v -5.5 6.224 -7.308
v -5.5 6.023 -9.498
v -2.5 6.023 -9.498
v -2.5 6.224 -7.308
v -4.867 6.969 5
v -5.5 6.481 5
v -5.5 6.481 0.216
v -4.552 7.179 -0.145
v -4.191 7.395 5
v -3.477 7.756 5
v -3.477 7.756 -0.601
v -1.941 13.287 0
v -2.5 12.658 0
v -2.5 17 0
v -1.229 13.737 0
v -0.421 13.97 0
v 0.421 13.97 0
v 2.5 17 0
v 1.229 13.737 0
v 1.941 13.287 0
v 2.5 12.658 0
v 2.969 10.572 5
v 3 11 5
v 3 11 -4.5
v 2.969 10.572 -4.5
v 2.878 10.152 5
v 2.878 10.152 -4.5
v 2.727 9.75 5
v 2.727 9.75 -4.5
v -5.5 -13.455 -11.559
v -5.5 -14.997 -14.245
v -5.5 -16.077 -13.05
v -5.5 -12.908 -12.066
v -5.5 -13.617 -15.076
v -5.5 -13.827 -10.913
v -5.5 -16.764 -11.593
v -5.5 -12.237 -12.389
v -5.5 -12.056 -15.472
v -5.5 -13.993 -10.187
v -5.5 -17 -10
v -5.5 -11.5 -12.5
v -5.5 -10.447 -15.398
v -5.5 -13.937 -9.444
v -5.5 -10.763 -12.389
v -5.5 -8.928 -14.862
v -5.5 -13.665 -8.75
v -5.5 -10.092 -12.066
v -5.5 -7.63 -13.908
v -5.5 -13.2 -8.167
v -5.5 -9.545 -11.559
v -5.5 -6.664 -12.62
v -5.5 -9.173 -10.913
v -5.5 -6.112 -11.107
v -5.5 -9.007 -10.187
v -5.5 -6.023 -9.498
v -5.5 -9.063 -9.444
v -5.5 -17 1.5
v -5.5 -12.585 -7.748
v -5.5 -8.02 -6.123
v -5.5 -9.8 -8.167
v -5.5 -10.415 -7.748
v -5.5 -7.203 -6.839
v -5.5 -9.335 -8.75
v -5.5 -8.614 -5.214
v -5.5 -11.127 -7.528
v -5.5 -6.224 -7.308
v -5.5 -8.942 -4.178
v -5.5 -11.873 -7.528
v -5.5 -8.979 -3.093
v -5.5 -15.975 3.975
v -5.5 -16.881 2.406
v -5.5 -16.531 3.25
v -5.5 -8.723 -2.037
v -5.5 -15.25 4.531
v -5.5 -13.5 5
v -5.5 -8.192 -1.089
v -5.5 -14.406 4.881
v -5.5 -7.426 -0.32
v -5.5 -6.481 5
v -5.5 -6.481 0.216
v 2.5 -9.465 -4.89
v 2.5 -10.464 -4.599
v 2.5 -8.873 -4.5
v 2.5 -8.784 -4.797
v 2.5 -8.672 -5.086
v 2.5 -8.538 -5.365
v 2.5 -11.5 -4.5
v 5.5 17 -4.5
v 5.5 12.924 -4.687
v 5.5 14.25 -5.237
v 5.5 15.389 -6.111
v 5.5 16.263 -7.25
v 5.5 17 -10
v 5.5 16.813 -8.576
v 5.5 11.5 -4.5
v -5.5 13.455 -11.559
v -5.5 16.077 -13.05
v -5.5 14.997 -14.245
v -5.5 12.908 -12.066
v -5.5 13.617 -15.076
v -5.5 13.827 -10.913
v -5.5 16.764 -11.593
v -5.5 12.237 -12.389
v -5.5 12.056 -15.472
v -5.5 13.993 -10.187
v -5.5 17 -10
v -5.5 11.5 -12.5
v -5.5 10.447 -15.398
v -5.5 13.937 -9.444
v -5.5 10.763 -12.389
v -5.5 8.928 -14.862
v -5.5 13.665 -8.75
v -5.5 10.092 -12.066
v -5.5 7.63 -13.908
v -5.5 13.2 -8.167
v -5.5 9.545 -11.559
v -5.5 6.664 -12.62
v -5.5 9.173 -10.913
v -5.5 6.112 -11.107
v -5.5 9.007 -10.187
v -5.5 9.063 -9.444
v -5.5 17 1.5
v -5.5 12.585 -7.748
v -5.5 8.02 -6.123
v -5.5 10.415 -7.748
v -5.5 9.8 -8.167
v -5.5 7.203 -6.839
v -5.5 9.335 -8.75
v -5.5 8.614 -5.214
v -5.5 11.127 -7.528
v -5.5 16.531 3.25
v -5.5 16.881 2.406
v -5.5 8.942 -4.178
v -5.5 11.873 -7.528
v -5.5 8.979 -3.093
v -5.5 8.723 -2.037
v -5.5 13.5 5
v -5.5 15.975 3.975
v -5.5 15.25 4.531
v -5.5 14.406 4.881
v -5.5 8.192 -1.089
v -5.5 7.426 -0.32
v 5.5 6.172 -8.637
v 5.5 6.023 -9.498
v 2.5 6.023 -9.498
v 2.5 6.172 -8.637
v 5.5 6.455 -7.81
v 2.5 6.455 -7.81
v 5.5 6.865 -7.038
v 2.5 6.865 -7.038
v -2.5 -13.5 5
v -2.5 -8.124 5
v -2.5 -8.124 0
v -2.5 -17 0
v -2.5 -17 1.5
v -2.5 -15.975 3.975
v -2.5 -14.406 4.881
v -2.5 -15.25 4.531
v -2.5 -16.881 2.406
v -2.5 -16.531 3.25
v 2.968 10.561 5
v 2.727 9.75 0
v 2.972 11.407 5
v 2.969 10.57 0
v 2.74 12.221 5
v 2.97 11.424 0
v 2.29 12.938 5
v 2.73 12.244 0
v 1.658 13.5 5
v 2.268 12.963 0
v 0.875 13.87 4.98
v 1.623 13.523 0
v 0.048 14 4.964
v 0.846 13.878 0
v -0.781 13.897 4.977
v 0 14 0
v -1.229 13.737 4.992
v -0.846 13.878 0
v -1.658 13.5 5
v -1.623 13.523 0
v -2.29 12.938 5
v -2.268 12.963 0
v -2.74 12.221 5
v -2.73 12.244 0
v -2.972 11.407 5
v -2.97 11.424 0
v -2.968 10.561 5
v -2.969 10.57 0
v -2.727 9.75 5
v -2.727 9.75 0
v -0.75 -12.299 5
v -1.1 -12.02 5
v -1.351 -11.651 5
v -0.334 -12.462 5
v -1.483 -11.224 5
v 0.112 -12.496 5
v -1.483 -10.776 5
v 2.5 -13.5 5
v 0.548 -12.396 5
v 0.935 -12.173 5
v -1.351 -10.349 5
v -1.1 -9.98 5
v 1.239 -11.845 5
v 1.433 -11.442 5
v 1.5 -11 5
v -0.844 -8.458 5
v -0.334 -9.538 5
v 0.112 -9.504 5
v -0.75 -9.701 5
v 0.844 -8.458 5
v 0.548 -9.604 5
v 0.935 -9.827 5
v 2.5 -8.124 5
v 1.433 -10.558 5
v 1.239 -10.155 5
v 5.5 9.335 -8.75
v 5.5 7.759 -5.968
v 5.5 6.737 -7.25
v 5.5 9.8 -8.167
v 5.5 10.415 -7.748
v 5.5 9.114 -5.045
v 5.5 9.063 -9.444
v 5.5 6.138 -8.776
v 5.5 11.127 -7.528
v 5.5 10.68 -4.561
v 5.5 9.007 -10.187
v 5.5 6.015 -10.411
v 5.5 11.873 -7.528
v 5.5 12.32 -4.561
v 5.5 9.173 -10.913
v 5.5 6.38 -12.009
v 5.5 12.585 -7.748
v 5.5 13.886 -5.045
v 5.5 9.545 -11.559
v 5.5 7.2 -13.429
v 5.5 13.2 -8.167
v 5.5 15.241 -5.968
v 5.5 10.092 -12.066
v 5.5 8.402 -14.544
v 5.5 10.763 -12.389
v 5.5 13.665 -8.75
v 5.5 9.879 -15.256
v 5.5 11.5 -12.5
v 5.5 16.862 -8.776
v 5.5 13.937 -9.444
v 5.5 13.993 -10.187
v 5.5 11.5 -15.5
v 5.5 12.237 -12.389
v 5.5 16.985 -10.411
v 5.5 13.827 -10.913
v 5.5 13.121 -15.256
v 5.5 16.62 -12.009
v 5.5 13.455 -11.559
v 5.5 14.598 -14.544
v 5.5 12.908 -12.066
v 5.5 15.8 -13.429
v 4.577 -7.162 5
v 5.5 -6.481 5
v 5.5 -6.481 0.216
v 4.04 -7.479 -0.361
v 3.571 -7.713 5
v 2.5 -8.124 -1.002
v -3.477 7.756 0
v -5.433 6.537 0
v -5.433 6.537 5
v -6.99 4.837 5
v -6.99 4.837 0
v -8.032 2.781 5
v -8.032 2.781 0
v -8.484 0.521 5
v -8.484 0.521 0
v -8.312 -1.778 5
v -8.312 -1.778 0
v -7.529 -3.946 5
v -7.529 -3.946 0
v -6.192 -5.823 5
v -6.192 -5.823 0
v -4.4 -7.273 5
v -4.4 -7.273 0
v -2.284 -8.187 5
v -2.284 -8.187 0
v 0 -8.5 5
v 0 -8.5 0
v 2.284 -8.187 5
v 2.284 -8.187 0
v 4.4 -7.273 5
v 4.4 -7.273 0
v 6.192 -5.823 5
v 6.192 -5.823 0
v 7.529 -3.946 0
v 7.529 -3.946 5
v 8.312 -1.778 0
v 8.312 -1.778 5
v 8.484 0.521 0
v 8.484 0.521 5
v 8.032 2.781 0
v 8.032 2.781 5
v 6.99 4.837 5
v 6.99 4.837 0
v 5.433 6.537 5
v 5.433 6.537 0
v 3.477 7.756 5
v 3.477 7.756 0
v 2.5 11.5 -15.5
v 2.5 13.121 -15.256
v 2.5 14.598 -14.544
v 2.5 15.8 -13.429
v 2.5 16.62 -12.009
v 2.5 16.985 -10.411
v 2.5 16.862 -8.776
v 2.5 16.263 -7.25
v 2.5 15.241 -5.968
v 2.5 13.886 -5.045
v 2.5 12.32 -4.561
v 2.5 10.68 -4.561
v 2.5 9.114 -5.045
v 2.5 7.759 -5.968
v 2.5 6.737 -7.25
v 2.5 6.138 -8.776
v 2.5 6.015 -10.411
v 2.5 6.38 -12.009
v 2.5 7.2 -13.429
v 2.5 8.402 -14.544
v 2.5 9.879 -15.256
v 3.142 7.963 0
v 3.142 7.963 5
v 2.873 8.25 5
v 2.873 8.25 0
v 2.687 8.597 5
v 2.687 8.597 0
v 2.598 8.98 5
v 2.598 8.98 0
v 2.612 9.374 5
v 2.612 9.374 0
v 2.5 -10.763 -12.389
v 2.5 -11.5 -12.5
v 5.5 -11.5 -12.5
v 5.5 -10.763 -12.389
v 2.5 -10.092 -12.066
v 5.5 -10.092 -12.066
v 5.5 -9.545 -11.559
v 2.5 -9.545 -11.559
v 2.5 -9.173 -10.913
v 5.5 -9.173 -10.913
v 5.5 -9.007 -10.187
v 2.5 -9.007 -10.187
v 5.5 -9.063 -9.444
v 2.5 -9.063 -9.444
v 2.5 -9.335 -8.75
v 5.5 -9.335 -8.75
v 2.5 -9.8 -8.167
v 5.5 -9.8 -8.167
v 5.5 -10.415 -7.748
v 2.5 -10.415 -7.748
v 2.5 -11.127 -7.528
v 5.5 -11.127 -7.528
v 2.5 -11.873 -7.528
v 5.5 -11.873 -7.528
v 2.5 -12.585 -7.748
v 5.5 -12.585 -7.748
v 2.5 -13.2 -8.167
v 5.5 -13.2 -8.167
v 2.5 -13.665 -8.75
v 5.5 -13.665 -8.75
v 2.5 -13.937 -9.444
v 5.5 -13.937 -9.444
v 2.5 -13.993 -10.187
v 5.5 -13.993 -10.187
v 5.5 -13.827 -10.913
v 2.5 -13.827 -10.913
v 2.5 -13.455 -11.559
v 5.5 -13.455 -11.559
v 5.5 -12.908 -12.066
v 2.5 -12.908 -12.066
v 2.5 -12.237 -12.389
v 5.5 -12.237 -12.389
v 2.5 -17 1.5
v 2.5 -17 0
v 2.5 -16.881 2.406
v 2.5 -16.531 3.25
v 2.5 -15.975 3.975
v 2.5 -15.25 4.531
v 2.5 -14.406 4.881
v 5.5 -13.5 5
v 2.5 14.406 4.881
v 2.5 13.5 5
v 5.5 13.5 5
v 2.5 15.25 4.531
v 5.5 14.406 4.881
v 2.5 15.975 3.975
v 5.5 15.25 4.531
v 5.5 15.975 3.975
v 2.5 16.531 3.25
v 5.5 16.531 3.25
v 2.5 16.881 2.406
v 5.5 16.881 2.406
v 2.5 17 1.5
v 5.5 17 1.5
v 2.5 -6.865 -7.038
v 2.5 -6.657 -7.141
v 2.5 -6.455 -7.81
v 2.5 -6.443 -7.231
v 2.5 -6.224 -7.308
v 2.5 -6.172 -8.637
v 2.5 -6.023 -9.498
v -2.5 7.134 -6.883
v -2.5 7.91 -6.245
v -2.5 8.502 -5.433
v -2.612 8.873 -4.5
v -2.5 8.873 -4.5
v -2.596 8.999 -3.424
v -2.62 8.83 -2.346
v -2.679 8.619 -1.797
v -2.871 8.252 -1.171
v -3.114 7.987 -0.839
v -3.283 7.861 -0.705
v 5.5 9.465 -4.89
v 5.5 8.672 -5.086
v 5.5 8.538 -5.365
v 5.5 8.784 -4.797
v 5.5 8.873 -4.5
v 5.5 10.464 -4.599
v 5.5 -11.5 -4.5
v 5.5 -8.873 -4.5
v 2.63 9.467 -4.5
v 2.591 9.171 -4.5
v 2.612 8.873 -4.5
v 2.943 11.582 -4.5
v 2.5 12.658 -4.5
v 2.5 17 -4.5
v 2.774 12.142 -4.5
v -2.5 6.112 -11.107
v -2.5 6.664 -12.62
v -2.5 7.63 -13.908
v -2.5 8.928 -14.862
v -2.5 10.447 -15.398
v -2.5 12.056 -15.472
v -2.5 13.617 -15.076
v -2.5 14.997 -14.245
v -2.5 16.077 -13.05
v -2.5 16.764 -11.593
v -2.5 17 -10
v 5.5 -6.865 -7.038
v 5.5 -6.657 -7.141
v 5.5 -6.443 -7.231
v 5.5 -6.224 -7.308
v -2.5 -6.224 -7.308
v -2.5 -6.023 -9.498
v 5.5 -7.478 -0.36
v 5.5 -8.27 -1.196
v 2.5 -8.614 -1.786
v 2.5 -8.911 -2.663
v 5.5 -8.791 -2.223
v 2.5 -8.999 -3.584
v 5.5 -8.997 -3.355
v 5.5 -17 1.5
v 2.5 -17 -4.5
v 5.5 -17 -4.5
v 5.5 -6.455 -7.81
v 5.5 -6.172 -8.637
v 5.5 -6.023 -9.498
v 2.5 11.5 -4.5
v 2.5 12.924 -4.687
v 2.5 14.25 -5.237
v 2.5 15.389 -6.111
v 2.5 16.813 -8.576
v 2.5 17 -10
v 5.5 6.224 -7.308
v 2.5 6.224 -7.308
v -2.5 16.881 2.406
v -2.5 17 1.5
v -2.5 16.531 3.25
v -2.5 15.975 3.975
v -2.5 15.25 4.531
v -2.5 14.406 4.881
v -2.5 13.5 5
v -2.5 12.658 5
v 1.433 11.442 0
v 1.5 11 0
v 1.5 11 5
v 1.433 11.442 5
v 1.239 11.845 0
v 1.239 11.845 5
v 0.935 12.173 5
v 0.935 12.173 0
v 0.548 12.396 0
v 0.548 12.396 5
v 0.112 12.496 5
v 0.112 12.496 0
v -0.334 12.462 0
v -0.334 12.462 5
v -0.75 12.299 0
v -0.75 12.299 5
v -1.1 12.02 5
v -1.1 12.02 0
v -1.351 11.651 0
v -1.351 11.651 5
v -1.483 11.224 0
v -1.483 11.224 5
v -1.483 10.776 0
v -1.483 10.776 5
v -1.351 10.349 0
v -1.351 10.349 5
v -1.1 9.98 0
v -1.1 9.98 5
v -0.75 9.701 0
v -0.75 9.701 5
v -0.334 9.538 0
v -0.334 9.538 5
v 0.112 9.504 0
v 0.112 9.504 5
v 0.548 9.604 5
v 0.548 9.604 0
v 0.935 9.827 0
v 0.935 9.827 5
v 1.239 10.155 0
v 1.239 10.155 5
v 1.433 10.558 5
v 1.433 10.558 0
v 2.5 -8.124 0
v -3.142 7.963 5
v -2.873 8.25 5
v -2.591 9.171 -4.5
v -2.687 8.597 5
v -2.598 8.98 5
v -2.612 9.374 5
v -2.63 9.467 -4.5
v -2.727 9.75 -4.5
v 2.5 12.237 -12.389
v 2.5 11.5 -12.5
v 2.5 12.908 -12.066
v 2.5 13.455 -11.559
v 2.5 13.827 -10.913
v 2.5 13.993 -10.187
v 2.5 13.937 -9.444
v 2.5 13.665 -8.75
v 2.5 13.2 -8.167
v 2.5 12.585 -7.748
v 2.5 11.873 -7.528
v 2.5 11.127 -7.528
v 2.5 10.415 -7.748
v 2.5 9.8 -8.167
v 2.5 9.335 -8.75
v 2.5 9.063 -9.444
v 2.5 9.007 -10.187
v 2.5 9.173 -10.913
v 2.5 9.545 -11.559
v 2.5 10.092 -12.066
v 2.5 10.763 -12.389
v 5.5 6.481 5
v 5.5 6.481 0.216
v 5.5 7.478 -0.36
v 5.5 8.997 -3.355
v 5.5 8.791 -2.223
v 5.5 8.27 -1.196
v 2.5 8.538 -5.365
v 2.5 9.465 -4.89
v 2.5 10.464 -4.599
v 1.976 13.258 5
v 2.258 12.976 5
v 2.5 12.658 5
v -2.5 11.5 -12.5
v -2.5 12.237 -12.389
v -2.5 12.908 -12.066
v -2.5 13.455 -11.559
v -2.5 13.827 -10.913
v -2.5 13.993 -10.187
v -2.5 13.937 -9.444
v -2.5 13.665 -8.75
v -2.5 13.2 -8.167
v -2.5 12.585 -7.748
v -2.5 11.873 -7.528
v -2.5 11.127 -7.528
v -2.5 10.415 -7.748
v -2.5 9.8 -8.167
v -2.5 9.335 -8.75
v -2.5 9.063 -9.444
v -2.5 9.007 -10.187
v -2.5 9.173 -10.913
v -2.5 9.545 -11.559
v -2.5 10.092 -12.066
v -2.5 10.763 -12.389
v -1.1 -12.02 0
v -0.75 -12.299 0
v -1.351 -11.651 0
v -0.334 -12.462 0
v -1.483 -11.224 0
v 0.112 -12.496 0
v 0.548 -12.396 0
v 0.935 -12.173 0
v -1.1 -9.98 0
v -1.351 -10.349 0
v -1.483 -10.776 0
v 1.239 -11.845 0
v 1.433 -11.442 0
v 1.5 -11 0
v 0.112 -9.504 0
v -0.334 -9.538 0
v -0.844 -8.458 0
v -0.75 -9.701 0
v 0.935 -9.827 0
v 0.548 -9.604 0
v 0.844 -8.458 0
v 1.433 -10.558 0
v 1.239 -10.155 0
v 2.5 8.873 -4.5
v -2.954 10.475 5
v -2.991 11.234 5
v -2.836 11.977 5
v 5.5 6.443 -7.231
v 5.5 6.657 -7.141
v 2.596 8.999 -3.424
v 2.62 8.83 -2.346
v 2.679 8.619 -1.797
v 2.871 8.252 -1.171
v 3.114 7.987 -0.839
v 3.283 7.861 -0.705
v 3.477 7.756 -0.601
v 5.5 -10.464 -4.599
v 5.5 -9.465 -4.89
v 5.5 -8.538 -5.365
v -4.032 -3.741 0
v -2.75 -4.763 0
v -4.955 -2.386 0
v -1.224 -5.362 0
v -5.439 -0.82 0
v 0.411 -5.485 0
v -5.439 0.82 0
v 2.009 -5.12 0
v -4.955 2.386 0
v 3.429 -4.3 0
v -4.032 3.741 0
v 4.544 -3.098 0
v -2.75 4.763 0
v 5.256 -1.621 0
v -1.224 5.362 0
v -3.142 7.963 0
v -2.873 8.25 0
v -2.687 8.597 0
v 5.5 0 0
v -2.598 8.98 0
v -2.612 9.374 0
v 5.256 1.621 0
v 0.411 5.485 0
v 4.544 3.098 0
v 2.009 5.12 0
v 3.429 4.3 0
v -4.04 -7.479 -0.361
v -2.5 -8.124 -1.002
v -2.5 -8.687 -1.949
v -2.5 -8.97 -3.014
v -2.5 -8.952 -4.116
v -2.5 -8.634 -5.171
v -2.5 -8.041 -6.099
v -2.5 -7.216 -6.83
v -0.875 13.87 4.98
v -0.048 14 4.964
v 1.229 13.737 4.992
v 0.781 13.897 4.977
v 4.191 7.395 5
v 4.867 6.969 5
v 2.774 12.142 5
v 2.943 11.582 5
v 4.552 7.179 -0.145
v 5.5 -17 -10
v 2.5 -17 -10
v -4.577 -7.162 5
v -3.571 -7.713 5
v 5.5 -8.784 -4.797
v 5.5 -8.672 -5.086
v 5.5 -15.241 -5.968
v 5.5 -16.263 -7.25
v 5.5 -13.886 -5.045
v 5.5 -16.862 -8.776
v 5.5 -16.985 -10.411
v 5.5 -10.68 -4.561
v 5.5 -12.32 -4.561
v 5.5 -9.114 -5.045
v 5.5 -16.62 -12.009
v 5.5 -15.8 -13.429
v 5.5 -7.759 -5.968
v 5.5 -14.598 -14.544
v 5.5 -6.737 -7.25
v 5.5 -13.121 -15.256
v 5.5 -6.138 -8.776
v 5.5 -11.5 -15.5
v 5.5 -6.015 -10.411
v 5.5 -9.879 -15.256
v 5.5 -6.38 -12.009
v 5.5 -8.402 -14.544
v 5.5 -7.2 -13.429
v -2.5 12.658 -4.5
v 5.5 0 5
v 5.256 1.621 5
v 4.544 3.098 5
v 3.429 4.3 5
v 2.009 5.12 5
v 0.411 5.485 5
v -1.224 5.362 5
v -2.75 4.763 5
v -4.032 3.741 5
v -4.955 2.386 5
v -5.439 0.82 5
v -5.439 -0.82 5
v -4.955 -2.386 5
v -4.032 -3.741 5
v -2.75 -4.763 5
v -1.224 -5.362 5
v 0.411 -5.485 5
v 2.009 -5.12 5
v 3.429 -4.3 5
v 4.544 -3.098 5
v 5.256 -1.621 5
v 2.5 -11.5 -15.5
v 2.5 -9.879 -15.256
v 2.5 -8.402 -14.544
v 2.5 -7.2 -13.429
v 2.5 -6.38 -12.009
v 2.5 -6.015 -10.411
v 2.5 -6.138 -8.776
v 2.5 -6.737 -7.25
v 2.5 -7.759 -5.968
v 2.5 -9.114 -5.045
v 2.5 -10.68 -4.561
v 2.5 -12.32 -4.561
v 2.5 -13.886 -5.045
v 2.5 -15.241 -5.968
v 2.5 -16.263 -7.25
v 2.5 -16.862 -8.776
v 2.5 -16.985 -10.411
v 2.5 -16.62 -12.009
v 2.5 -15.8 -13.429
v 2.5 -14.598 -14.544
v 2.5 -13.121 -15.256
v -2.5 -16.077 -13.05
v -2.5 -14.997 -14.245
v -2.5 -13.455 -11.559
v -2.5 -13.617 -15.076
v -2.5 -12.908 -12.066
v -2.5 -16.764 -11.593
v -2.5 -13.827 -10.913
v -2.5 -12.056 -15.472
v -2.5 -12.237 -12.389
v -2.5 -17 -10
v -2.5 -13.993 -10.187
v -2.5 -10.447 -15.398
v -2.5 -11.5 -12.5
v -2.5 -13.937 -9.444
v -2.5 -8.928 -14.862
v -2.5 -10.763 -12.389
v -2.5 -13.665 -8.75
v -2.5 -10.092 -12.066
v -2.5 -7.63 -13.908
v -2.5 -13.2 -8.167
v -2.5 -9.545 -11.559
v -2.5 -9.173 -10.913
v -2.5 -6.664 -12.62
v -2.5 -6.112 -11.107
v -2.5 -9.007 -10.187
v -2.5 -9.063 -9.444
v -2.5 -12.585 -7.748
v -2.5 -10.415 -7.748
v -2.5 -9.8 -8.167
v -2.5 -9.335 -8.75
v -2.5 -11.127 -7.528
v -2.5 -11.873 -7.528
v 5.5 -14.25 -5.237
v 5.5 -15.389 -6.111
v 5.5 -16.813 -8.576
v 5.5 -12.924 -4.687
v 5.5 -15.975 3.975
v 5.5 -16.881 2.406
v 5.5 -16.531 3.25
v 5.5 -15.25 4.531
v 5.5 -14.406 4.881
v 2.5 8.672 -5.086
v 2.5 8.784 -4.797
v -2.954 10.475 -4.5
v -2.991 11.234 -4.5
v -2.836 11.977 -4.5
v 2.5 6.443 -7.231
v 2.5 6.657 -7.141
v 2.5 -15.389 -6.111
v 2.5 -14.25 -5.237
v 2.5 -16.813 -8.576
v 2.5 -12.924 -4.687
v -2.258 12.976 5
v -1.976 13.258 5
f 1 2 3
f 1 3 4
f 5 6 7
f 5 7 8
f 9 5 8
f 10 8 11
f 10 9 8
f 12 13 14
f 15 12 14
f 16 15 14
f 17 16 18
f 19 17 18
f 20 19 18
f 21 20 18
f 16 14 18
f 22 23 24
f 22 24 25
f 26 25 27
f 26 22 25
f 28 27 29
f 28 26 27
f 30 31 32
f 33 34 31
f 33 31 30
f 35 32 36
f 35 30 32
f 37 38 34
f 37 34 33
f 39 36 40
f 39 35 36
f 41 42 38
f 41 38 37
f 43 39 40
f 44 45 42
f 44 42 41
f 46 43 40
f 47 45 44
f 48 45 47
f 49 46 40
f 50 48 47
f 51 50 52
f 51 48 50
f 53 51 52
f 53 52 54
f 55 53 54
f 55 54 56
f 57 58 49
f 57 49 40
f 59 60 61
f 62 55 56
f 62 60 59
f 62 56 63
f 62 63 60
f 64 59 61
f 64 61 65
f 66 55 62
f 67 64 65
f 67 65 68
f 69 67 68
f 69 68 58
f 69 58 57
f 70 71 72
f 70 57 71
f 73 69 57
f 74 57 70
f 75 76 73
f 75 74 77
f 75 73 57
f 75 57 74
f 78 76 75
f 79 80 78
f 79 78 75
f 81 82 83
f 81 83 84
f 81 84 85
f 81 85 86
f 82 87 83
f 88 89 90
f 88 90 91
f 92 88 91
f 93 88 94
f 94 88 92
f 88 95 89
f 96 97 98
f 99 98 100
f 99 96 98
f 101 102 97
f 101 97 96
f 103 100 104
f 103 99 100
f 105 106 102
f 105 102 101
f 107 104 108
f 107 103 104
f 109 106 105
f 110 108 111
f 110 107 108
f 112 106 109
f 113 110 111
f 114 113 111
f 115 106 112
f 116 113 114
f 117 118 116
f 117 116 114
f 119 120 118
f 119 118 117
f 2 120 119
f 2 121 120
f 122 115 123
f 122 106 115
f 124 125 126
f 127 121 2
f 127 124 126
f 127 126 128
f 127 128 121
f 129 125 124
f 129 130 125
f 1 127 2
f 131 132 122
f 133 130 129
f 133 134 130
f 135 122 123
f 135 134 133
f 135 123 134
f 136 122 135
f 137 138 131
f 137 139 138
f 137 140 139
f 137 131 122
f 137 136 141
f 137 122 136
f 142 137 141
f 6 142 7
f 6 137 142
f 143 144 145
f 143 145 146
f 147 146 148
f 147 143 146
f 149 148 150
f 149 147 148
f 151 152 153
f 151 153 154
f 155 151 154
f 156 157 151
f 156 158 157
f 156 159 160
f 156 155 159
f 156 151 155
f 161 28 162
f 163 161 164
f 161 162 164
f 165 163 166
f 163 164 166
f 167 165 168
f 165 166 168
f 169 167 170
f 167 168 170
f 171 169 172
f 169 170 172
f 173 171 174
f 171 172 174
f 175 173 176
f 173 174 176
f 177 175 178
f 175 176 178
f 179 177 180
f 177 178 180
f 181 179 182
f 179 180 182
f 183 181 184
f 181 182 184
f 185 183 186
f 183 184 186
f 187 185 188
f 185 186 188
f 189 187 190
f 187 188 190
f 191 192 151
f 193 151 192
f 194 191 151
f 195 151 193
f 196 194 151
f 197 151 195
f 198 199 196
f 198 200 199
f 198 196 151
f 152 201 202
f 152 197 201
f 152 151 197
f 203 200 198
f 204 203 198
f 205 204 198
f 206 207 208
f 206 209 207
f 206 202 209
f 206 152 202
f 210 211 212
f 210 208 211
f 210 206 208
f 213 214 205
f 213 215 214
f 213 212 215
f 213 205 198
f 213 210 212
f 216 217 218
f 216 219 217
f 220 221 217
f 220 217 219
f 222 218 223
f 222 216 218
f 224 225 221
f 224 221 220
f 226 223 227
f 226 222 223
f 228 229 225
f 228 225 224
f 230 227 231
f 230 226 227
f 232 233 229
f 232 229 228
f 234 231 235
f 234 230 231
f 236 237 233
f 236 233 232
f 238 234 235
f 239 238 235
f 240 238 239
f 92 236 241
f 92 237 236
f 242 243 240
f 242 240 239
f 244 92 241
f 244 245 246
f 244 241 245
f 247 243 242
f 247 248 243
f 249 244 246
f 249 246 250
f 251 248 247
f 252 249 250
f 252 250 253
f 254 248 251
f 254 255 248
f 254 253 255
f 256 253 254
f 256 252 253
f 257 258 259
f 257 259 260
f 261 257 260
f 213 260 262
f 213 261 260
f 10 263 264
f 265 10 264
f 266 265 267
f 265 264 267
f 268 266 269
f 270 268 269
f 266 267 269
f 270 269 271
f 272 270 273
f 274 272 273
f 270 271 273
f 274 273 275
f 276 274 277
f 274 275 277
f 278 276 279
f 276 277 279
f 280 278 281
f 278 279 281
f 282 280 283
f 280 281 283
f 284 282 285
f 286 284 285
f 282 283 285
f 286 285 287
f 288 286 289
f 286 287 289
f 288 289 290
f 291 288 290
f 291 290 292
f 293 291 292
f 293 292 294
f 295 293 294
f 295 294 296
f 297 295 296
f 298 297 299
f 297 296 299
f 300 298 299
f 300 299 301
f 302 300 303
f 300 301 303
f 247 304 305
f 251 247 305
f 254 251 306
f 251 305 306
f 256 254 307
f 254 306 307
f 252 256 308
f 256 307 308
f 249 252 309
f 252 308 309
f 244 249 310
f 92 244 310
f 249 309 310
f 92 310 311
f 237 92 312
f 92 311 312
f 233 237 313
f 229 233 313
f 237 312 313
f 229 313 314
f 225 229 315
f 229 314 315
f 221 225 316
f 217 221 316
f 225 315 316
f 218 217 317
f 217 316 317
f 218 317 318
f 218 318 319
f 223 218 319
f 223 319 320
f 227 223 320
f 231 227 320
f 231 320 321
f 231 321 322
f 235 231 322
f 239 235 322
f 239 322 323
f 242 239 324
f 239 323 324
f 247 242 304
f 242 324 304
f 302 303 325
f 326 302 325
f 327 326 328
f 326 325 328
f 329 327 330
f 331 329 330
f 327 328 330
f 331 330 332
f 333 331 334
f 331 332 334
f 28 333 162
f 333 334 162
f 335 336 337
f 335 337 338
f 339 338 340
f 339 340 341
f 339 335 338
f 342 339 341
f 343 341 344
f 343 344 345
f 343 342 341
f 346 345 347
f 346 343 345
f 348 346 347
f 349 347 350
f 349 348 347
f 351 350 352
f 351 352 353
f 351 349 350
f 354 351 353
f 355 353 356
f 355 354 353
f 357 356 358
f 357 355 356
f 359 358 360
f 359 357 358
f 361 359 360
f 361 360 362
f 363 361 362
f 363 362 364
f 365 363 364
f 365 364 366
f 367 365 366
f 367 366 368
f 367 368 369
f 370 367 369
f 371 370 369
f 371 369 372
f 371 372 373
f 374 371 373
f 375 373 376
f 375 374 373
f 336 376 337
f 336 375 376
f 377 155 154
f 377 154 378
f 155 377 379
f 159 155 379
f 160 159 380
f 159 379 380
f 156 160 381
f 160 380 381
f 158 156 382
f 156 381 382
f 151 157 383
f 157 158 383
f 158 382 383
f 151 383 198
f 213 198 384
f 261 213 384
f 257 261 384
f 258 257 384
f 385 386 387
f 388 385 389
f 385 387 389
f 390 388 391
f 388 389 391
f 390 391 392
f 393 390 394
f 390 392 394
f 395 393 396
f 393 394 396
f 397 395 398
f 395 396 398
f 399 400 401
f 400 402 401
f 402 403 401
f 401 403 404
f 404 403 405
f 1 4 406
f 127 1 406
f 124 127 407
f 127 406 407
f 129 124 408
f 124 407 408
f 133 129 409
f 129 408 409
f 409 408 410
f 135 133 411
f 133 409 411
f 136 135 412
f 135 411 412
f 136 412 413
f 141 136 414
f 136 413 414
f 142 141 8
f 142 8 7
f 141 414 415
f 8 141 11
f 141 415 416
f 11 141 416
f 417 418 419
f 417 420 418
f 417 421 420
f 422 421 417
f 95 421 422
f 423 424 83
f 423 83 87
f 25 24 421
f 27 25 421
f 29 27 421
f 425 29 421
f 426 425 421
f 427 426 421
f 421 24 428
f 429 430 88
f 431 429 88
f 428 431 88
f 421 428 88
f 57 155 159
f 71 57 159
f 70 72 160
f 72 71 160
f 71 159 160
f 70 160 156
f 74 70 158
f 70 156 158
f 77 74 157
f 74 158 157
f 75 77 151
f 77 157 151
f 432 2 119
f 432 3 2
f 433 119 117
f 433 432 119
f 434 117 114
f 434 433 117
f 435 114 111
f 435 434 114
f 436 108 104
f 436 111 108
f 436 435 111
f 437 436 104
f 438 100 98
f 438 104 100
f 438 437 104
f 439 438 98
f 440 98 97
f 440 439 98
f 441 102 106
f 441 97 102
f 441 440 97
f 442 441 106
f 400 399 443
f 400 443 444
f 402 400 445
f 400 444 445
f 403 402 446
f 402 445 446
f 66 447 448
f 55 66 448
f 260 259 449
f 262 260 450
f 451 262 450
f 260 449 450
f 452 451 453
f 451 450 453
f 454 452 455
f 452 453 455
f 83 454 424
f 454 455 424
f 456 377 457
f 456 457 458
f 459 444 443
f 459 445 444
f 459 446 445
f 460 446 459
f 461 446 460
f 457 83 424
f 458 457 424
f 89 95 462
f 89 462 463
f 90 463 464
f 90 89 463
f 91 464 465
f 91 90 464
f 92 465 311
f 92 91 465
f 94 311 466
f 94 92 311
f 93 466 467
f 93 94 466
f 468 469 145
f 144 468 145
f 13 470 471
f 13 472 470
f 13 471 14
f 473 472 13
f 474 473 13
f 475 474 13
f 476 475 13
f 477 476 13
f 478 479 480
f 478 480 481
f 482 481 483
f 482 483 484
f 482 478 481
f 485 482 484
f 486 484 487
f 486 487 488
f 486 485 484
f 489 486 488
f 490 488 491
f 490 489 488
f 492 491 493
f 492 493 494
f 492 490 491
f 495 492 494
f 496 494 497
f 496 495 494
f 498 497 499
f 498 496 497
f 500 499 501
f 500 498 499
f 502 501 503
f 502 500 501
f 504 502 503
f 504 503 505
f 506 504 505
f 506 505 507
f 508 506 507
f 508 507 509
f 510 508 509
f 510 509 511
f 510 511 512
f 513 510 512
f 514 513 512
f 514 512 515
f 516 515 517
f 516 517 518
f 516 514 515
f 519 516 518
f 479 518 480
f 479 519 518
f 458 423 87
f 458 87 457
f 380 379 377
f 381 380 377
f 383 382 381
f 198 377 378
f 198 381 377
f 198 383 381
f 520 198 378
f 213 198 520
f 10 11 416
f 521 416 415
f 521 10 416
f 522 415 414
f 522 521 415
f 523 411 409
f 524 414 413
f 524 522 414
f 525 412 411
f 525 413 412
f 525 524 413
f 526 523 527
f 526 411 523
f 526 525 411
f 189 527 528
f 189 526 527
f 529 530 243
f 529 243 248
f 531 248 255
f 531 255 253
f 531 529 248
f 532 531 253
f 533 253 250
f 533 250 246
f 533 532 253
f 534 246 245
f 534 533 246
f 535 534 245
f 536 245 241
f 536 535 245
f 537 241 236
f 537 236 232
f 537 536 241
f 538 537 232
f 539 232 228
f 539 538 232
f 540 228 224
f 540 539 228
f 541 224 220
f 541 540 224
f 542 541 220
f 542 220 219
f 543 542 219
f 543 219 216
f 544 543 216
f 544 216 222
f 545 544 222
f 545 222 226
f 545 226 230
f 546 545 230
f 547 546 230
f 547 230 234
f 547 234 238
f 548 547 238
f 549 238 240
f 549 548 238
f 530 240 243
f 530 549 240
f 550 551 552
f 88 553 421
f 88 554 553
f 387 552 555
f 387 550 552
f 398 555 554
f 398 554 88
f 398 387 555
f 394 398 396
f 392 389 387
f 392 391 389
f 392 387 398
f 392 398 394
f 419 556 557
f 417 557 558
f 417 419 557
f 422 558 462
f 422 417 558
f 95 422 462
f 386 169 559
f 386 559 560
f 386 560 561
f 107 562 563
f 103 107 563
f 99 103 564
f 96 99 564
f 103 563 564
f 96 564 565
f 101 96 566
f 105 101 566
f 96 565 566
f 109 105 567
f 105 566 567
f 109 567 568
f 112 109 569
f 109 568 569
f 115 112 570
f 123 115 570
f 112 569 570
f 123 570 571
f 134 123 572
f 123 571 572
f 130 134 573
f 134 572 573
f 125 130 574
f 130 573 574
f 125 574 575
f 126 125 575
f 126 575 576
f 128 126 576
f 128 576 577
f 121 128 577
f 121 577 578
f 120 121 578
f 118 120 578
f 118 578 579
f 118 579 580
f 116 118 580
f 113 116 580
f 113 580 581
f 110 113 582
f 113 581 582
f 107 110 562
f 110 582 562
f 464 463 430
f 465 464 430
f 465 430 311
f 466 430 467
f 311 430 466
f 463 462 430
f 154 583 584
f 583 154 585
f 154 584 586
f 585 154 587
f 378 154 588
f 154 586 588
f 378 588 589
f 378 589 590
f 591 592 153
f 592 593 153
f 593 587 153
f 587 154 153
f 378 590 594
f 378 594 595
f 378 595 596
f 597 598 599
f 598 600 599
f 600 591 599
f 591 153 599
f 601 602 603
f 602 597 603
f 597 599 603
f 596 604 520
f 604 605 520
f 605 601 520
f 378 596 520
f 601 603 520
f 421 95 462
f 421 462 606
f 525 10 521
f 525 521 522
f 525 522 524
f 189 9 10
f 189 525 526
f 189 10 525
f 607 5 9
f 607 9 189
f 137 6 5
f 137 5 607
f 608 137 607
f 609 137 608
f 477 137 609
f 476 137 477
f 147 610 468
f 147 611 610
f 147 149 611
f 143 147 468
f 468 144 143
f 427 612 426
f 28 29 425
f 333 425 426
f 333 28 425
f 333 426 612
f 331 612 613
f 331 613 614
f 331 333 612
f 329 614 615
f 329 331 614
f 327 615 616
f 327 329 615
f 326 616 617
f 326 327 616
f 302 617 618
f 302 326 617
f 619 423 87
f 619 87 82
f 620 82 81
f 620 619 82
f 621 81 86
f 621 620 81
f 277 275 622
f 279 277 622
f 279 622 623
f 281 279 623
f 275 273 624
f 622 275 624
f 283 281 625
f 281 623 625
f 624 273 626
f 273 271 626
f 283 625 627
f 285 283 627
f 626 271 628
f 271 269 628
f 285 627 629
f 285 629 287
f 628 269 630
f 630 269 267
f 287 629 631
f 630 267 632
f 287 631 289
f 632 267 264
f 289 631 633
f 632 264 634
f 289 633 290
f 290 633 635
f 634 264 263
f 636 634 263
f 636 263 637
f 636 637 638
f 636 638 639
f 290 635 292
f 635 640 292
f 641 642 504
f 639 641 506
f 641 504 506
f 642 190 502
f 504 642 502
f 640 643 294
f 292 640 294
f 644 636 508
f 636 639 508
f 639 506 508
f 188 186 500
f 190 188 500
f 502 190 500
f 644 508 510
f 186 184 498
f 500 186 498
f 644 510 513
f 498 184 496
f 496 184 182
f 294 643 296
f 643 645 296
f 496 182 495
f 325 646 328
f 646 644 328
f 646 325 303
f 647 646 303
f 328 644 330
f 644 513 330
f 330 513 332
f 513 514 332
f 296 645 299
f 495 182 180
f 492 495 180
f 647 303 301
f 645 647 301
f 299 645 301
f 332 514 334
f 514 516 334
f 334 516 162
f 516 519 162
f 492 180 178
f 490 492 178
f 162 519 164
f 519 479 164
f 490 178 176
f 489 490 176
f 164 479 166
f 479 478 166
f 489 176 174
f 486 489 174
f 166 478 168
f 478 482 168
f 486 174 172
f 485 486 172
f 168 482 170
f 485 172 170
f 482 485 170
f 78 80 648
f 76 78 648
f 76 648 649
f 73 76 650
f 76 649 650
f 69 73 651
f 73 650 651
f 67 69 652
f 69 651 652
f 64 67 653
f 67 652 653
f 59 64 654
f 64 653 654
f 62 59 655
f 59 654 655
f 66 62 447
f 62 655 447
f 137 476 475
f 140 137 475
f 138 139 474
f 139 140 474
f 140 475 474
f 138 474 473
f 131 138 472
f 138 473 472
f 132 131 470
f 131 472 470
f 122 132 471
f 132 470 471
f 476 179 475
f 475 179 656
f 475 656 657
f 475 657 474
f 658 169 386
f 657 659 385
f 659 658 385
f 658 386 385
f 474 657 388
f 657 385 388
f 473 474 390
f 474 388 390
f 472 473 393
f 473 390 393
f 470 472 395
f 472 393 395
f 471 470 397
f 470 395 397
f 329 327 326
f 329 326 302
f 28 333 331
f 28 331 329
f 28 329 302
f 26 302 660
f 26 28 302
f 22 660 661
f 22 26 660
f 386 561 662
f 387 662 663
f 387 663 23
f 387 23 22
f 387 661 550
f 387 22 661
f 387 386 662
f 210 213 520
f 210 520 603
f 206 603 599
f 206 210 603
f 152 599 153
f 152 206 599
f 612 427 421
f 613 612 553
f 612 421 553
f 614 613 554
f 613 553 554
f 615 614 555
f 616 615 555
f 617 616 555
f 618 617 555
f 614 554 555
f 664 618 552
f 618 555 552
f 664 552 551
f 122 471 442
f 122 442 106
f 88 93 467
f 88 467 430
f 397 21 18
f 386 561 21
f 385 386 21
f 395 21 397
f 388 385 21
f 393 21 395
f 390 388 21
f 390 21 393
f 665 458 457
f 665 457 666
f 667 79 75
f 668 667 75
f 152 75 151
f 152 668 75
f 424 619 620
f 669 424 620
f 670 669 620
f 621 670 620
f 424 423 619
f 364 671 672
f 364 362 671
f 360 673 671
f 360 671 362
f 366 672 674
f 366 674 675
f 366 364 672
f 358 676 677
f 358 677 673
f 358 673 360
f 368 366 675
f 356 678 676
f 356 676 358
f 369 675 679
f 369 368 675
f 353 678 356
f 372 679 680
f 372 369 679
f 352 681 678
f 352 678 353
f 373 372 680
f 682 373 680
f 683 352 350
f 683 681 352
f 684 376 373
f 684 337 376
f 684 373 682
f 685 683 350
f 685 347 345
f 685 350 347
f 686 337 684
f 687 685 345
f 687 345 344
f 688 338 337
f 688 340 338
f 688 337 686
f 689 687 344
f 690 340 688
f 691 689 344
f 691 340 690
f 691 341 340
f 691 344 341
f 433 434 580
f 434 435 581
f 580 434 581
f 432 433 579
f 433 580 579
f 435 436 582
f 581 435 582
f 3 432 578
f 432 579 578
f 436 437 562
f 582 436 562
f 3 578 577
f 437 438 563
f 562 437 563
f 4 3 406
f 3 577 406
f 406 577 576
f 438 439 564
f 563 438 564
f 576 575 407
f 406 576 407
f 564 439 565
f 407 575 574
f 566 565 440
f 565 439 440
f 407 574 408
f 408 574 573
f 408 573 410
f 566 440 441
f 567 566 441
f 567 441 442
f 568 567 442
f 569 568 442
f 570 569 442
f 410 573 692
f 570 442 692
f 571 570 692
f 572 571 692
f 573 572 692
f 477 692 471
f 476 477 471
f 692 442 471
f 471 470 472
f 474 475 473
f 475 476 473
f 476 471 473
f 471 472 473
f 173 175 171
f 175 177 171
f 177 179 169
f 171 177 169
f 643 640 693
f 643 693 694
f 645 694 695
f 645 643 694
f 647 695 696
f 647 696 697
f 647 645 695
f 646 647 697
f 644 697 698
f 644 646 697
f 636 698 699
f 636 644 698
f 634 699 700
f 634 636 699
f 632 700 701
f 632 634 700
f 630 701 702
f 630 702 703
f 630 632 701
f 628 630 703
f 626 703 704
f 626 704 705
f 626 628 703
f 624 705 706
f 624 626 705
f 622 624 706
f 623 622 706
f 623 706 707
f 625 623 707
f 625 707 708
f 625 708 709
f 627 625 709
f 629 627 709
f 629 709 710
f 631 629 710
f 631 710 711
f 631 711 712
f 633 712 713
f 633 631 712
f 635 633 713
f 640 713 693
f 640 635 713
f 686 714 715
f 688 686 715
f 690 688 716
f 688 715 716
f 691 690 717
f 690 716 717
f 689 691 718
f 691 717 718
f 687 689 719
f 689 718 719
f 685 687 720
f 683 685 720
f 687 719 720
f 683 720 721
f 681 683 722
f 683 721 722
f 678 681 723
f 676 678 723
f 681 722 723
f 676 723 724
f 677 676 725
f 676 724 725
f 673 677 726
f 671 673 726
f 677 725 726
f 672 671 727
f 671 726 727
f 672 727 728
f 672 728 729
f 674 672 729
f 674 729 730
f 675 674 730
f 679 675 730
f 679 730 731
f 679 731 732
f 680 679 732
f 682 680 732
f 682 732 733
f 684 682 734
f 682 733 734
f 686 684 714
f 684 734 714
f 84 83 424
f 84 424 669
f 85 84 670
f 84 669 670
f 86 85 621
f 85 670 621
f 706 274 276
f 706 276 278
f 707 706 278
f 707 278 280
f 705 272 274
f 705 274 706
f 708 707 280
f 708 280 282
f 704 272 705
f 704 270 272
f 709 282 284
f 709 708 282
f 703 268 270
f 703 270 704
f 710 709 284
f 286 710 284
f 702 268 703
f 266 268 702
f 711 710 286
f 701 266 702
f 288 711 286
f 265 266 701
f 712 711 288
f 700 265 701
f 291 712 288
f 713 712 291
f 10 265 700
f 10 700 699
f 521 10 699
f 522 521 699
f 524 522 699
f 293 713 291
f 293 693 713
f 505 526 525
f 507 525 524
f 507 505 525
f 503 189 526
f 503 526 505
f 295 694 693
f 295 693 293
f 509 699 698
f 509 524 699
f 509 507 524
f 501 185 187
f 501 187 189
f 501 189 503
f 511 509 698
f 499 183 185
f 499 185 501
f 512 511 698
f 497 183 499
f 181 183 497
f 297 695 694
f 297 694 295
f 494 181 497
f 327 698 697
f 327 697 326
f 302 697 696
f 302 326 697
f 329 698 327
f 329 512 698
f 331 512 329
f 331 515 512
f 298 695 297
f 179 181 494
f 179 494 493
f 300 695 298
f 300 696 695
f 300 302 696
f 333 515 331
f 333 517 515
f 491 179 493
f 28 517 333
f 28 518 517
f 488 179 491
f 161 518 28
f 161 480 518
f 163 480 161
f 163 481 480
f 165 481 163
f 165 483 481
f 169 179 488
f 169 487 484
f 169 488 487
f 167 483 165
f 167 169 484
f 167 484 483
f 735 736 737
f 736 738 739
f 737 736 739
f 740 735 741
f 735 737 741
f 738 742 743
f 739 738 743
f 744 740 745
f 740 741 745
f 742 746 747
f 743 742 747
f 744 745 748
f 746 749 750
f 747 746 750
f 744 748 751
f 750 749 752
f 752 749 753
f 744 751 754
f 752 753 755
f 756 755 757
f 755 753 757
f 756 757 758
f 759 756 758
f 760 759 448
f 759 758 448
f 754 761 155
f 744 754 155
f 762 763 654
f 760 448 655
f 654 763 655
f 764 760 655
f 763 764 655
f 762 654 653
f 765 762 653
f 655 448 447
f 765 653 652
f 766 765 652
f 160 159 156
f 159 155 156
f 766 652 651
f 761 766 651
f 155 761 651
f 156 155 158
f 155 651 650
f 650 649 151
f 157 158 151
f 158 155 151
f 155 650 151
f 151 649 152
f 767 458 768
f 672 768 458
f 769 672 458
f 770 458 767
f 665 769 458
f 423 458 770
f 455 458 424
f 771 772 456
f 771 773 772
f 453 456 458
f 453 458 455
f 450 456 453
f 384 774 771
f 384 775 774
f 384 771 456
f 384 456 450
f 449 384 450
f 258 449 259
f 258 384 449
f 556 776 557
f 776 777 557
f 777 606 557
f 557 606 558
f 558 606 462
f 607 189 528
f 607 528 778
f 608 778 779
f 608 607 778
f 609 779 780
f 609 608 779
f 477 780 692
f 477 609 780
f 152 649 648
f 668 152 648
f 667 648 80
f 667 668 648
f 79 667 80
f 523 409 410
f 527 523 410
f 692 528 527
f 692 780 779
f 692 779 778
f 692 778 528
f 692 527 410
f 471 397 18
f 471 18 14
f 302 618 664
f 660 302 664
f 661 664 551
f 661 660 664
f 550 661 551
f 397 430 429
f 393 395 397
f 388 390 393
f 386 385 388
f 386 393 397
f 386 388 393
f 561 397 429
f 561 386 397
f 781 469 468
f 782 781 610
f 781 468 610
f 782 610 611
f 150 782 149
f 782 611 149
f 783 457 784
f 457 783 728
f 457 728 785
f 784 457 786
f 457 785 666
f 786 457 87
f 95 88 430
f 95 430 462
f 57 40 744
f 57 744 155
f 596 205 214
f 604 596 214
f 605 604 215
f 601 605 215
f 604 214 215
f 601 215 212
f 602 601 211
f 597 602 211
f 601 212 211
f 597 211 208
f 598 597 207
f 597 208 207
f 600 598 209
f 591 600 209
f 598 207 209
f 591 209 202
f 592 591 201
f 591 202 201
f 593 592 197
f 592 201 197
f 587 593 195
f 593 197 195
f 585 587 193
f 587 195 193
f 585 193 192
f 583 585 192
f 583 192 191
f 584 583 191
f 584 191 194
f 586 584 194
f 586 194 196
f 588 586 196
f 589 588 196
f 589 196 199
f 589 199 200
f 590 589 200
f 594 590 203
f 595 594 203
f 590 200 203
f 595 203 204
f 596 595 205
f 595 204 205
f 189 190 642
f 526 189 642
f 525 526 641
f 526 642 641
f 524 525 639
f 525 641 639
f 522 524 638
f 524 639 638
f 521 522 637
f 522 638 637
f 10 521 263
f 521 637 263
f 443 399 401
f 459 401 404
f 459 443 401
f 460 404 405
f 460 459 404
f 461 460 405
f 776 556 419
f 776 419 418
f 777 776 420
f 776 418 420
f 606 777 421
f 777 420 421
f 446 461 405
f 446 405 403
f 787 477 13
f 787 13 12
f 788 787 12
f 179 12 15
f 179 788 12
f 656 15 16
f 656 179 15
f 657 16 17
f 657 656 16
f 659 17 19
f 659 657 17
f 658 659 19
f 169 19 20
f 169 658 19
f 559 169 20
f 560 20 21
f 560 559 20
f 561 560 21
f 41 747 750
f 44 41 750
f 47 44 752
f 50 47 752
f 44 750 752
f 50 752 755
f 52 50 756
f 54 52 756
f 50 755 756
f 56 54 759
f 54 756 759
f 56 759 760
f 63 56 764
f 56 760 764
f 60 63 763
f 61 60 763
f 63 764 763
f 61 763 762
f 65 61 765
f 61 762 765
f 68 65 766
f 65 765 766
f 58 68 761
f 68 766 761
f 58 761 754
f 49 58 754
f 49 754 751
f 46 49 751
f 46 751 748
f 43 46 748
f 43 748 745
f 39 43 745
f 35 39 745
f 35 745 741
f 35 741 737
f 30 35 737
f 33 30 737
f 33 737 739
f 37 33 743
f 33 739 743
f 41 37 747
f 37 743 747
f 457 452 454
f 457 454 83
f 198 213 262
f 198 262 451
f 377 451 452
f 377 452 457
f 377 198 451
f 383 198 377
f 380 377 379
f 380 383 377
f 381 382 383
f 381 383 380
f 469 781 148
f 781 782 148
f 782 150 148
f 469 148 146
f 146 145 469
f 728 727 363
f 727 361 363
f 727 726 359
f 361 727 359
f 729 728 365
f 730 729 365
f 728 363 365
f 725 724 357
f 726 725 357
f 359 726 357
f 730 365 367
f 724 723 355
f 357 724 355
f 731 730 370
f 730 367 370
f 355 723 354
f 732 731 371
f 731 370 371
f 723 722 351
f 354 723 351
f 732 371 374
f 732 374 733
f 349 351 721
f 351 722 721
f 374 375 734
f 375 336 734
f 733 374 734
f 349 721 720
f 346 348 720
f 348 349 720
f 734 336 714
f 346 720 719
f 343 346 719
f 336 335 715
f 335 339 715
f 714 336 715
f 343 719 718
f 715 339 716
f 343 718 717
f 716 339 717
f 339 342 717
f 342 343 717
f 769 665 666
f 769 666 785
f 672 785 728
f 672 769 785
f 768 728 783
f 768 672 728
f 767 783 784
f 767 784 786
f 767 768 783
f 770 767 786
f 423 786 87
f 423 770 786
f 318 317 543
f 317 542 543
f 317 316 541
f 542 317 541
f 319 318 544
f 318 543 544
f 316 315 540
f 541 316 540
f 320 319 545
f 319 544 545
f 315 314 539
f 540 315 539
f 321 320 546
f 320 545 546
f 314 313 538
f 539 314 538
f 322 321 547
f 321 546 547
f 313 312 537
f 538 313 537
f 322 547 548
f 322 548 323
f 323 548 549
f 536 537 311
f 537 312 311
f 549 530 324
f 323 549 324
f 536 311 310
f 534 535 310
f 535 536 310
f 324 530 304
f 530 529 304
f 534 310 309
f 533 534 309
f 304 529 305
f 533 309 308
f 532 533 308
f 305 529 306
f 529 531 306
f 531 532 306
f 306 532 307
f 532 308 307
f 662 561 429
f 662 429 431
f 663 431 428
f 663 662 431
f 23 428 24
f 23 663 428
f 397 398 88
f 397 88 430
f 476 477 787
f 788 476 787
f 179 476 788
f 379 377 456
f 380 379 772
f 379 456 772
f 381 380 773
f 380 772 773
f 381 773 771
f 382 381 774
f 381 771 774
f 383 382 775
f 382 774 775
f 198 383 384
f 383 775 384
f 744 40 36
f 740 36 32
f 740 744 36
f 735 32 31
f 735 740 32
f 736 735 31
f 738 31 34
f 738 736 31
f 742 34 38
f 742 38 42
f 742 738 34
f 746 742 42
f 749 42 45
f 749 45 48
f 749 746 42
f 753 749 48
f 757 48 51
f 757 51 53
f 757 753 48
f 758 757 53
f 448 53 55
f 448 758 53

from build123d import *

# Parameters (mm, degrees)
SKETCH_1_R          = 5.5
SKETCH_1_R_2        = 1.5
EXTRUDE_1_DEPTH     = 5
EXTRUDE_START       = -2.5
SKETCH_2_R          = 5.5
SKETCH_2_R_2        = 2.5
EXTRUDE_2_DEPTH     = 3
EXTRUDE_2_2_DEPTH   = 3
EXTRUDE_START_2     = 2.5
SKETCH_3_R          = 5.5
SKETCH_3_R_2        = 2.5
EXTRUDE_3_DEPTH     = 3
EXTRUDE_3_2_DEPTH   = 3
EXTRUDE_4_DEPTH     = 9.5
EXTRUDE_4_2_DEPTH   = 9.5
EXTRUDE_4_3_DEPTH   = 9.5
EXTRUDE_4_4_DEPTH   = 9.5
EXTRUDE_5_DEPTH     = 3
EXTRUDE_6_DEPTH     = 3
EXTRUDE_6_2_DEPTH   = 3
EXTRUDE_6_3_DEPTH   = 3
EXTRUDE_6_4_DEPTH   = 3
EXTRUDE_7_DEPTH     = 5
EXTRUDE_7_2_DEPTH   = 5
SKETCH_8_R          = 4
CUT_EXTRUDE_1_DEPTH = 27.930466019
SKETCH_9_R          = 1.5
CUT_EXTRUDE_2_DEPTH = 5
CUT_EXTRUDE_3_DEPTH = 27.930466019


with BuildPart() as part:
    # Эскиз1 → Бобышка-Вытянуть1 (new body)
    with BuildSketch(Plane.XY):
        with BuildLine():
            ThreePointArc((-3.477151956, 7.756250013), (-2.2e-08, -8.5), (3.477151997, 7.756249995))
            ThreePointArc((3.477151997, 7.756249995), (2.686810587, 8.596884227), (2.727178017, 9.749999975))
            ThreePointArc((2.727178017, 9.749999975), (2.2e-08, 14), (-2.727178036, 9.750000015))
            ThreePointArc((-2.727178036, 9.750000015), (-2.686810571, 8.596884269), (-3.477151956, 7.756250013))
        make_face()
        Circle(SKETCH_1_R, mode=Mode.SUBTRACT)
        with Locations((0, 11)):
            Circle(SKETCH_1_R_2, mode=Mode.SUBTRACT)
    extrude(amount=EXTRUDE_1_DEPTH)


with BuildPart() as body_2:
    # Эскиз2 → Бобышка-Вытянуть2 (new body)
    with BuildSketch(Plane(origin=(0, 0, 0), x_dir=(0, 0, -1), z_dir=(1, 0, 0)).offset(EXTRUDE_START)):
        with Locations((10, 11.5)):
            Circle(SKETCH_2_R)
        with Locations((10, 11.5)):
            Circle(SKETCH_2_R_2, mode=Mode.SUBTRACT)
    extrude(amount=-EXTRUDE_2_DEPTH)



with BuildPart() as body_3:
    # Эскиз2 → Extrude 2 2 (new body)
    with BuildSketch(Plane(origin=(0, 0, 0), x_dir=(0, 0, -1), z_dir=(1, 0, 0)).offset(EXTRUDE_START)):
        with Locations((10, -11.5)):
            Circle(SKETCH_2_R)
        with Locations((10, -11.5)):
            Circle(SKETCH_2_R_2, mode=Mode.SUBTRACT)
    extrude(amount=-EXTRUDE_2_2_DEPTH)


with BuildPart() as body_4:
    # Эскиз3 → Бобышка-Вытянуть3 (new body)
    with BuildSketch(Plane(origin=(0, 0, 0), x_dir=(0, 0, -1), z_dir=(1, 0, 0)).offset(EXTRUDE_START_2)):
        with Locations((10, 11.5)):
            Circle(SKETCH_3_R)
        with Locations((10, 11.5)):
            Circle(SKETCH_3_R_2, mode=Mode.SUBTRACT)
    extrude(amount=EXTRUDE_3_DEPTH)


with BuildPart() as body_5:
    # Эскиз3 → Extrude 3 2 (new body)
    with BuildSketch(Plane(origin=(0, 0, 0), x_dir=(0, 0, -1), z_dir=(1, 0, 0)).offset(EXTRUDE_START_2)):
        with Locations((10, -11.5)):
            Circle(SKETCH_3_R)
        with Locations((10, -11.5)):
            Circle(SKETCH_3_R_2, mode=Mode.SUBTRACT)
    extrude(amount=EXTRUDE_3_2_DEPTH)


with BuildPart() as body_6:
    # Эскиз4 → Бобышка-Вытянуть4 (new body)
    with BuildSketch(Plane.XY.offset(5)):
        with BuildLine():
            ThreePointArc((-2.5, -8.124038405), (-4.083516479, -7.454857018), (-5.5, -6.480740698))
            Line((-5.5, -6.480740698), (-5.5, -17))
            Line((-5.5, -17), (-2.5, -17))
            Line((-2.5, -17), (-2.5, -8.124038405))
        make_face()
    extrude(amount=-EXTRUDE_4_DEPTH)


with BuildPart() as body_7:
    # Эскиз4 → Extrude 4 2 (new body)
    with BuildSketch(Plane.XY.offset(5)):
        with BuildLine():
            ThreePointArc((5.5, -6.480740698), (4.083516479, -7.454857018), (2.5, -8.124038405))
            Line((2.5, -8.124038405), (2.5, -17))
            Line((2.5, -17), (5.5, -17))
            Line((5.5, -17), (5.5, -6.480740698))
        make_face()
    extrude(amount=-EXTRUDE_4_2_DEPTH)


with BuildPart() as body_8:
    # Эскиз4 → Extrude 4 3 (new body)
    with BuildSketch(Plane.XY.offset(5)):
        with BuildLine():
            Line((2.5, 17), (2.5, 12.658312395))
            ThreePointArc((2.5, 12.658312395), (2.872281323, 11.866025404), (3, 11))
            ThreePointArc((3, 11), (2.931001031, 10.360286817), (2.727178029, 9.75))
            ThreePointArc((2.727178029, 9.75), (2.68681058, 8.596884246), (3.477151987, 7.75625))
            ThreePointArc((3.477151987, 7.75625), (4.533656961, 7.189989886), (5.5, 6.480740698))
            Line((5.5, 6.480740698), (5.5, 17))
            Line((5.5, 17), (2.5, 17))
        make_face()
    extrude(amount=-EXTRUDE_4_3_DEPTH)


with BuildPart() as body_9:
    # Эскиз4 → Extrude 4 4 (new body)
    with BuildSketch(Plane.XY.offset(5)):
        with BuildLine():
            Line((-5.5, 17), (-5.5, 6.480740698))
            ThreePointArc((-5.5, 6.480740698), (-4.533656961, 7.189989886), (-3.477151987, 7.75625))
            ThreePointArc((-3.477151987, 7.75625), (-2.68681058, 8.596884246), (-2.727178029, 9.75))
            ThreePointArc((-2.727178029, 9.75), (-2.990889129, 11.233628374), (-2.5, 12.658312395))
            Line((-2.5, 12.658312395), (-2.5, 17))
            Line((-2.5, 17), (-5.5, 17))
        make_face()
    extrude(amount=-EXTRUDE_4_4_DEPTH)


with BuildPart() as body_2_1:
    add(body_2.part)

    add(body_3.part)  # Бобышка-Вытянуть5 merges body 3

    add(body_6.part)  # Бобышка-Вытянуть5 merges body 6

    add(body_9.part)  # Бобышка-Вытянуть5 merges body 9
    # Эскиз5 → Бобышка-Вытянуть5 (add)
    with BuildSketch(Plane.ZY.offset(5.5)):
        with BuildLine():
            Line((-4.5, -6.480740698), (-9.498336734, -6.022926514))
            ThreePointArc((-9.498336734, -6.022926514), (-5.937417819, -7.792517563), (-4.5, -11.5))
            Line((-4.5, -11.5), (-4.5, -6.480740698))
        make_face()
        with BuildLine():
            Line((-4.5, -17), (-4.5, -11.5))
            ThreePointArc((-4.5, -11.5), (-6.110912703, -15.389087297), (-10, -17))
            Line((-10, -17), (-4.5, -17))
        make_face()
        with BuildLine():
            Line((-4.5, 6.480740698), (-4.5, 11.5))
            ThreePointArc((-4.5, 11.5), (-5.937417819, 7.792517563), (-9.498336734, 6.022926514))
            Line((-9.498336734, 6.022926514), (-4.5, 6.480740698))
        make_face()
        with BuildLine():
            Line((-4.5, 17), (-10, 17))
            ThreePointArc((-10, 17), (-6.110912703, 15.389087297), (-4.5, 11.5))
            Line((-4.5, 11.5), (-4.5, 17))
        make_face()
    extrude(amount=-EXTRUDE_5_DEPTH)


with BuildPart() as body_7_2:
    # Эскиз6 → Бобышка-Вытянуть6 (new body)
    with BuildSketch(Plane(origin=(5.5, 0, 0), x_dir=(0, 0, -1), z_dir=(1, 0, 0))):
        with BuildLine():
            Line((4.5, -6.480740698), (4.5, -11.5))
            ThreePointArc((4.5, -11.5), (5.937417819, -7.792517563), (9.498336734, -6.022926514))
            Line((9.498336734, -6.022926514), (4.5, -6.480740698))
        make_face()
    extrude(amount=-EXTRUDE_6_DEPTH)


with BuildPart() as body_8_2:
    # Эскиз6 → Extrude 6 2 (new body)
    with BuildSketch(Plane(origin=(5.5, 0, 0), x_dir=(0, 0, -1), z_dir=(1, 0, 0))):
        with BuildLine():
            Line((4.5, -17), (10, -17))
            ThreePointArc((10, -17), (6.110912703, -15.389087297), (4.5, -11.5))
            Line((4.5, -11.5), (4.5, -17))
        make_face()
    extrude(amount=-EXTRUDE_6_2_DEPTH)


with BuildPart() as body_9_2:
    # Эскиз6 → Extrude 6 3 (new body)
    with BuildSketch(Plane(origin=(5.5, 0, 0), x_dir=(0, 0, -1), z_dir=(1, 0, 0))):
        with BuildLine():
            ThreePointArc((4.5, 11.499999994), (6.110912701, 15.389087294), (10, 17))
            Line((10, 17), (4.5, 17))
            Line((4.5, 17), (4.5, 11.499999994))
        make_face()
    extrude(amount=-EXTRUDE_6_3_DEPTH)


with BuildPart() as body_10:
    # Эскиз6 → Extrude 6 4 (new body)
    with BuildSketch(Plane(origin=(5.5, 0, 0), x_dir=(0, 0, -1), z_dir=(1, 0, 0))):
        with BuildLine():
            ThreePointArc((9.498336734, 6.022926514), (5.937417821, 7.792517561), (4.5, 11.499999994))
            Line((4.5, 11.499999994), (4.5, 6.480740698))
            Line((4.5, 6.480740698), (9.498336734, 6.022926514))
        make_face()
    extrude(amount=-EXTRUDE_6_4_DEPTH)


with BuildPart() as body_11:
    # Эскиз7 → Бобышка-Вытянуть7 (new body)
    with BuildSketch(Plane.XY.offset(5)):
        with BuildLine():
            Line((-2.5, 17), (-2.5, 12.658312395))
            ThreePointArc((-2.5, 12.658312395), (0, 14), (2.5, 12.658312395))
            Line((2.5, 12.658312395), (2.5, 17))
            Line((2.5, 17), (-2.5, 17))
        make_face()
    extrude(amount=-EXTRUDE_7_DEPTH)


with BuildPart() as body_12:
    # Эскиз7 → Extrude 7 2 (new body)
    with BuildSketch(Plane.XY.offset(5)):
        with BuildLine():
            ThreePointArc((2.5, -8.124038405), (0, -8.5), (-2.5, -8.124038405))
            Line((-2.5, -8.124038405), (-2.5, -17))
            Line((-2.5, -17), (2.5, -17))
            Line((2.5, -17), (2.5, -8.124038405))
        make_face()
    extrude(amount=-EXTRUDE_7_2_DEPTH)

    # Эскиз9 → Вырез-Вытянуть2 (cut)
    with BuildSketch(Plane.XY.offset(5)):
        with Locations((0, -11)):
            Circle(SKETCH_9_R)
    extrude(amount=-CUT_EXTRUDE_2_DEPTH, mode=Mode.SUBTRACT)


with BuildPart() as cut_extrude_1_tool:
    # Эскиз8 → Вырез-Вытянуть1 (new, through all)
    with BuildSketch(Plane(origin=(5.5, 0, 0), x_dir=(0, 0, -1), z_dir=(1, 0, 0))):
        with Locations((3.5, 5)):
            Circle(SKETCH_8_R)
        with Locations((3.5, -5)):
            Circle(SKETCH_8_R)
    extrude(amount=-CUT_EXTRUDE_1_DEPTH)


with BuildPart() as body_2_2:
    add(body_2_1.part)

    # Вырез-Вытянуть1: cut by cut_extrude_1_tool
    add(cut_extrude_1_tool.part, mode=Mode.SUBTRACT)


with BuildPart() as body_7_1:
    add(body_7.part)

    # Вырез-Вытянуть1: cut by cut_extrude_1_tool
    add(cut_extrude_1_tool.part, mode=Mode.SUBTRACT)


with BuildPart() as body_8_1:
    add(body_8.part)

    # Вырез-Вытянуть1: cut by cut_extrude_1_tool
    add(cut_extrude_1_tool.part, mode=Mode.SUBTRACT)


with BuildPart() as body_7_2_1:
    add(body_7_2.part)

    # Вырез-Вытянуть1: cut by cut_extrude_1_tool
    add(cut_extrude_1_tool.part, mode=Mode.SUBTRACT)


with BuildPart() as body_10_1:
    add(body_10.part)

    # Вырез-Вытянуть1: cut by cut_extrude_1_tool
    add(cut_extrude_1_tool.part, mode=Mode.SUBTRACT)


with BuildPart() as cut_extrude_3_tool:
    # Эскиз10 → Вырез-Вытянуть3 (new, through all)
    with BuildSketch(Plane(origin=(5.5, 0, 0), x_dir=(0, 0, -1), z_dir=(1, 0, 0))):
        with BuildLine():
            ThreePointArc((-1.5, -17), (-3.974873734, -15.974873734), (-5, -13.5))
            Line((-5, -13.5), (-5, -17))
            Line((-5, -17), (-1.5, -17))
        make_face()
        with BuildLine():
            ThreePointArc((-5, 13.5), (-3.974873734, 15.974873734), (-1.5, 17))
            Line((-1.5, 17), (-5, 17))
            Line((-5, 17), (-5, 13.5))
        make_face()
    extrude(amount=-CUT_EXTRUDE_3_DEPTH)


with BuildPart() as part_1:
    add(part.part)

    # Вырез-Вытянуть3: cut by cut_extrude_3_tool
    add(cut_extrude_3_tool.part, mode=Mode.SUBTRACT)


with BuildPart() as body_2_3:
    add(body_2_2.part)

    # Вырез-Вытянуть3: cut by cut_extrude_3_tool
    add(cut_extrude_3_tool.part, mode=Mode.SUBTRACT)


with BuildPart() as body_7_3:
    add(body_7_1.part)

    # Вырез-Вытянуть3: cut by cut_extrude_3_tool
    add(cut_extrude_3_tool.part, mode=Mode.SUBTRACT)


with BuildPart() as body_8_3:
    add(body_8_1.part)

    # Вырез-Вытянуть3: cut by cut_extrude_3_tool
    add(cut_extrude_3_tool.part, mode=Mode.SUBTRACT)


with BuildPart() as body_11_1:
    add(body_11.part)

    # Вырез-Вытянуть3: cut by cut_extrude_3_tool
    add(cut_extrude_3_tool.part, mode=Mode.SUBTRACT)


with BuildPart() as body_12_1:
    add(body_12.part)

    # Вырез-Вытянуть3: cut by cut_extrude_3_tool
    add(cut_extrude_3_tool.part, mode=Mode.SUBTRACT)


solid = Compound([body_4.part, body_5.part, body_8_2.part, body_9_2.part, body_7_2_1.part, body_10_1.part, part_1.part, body_2_3.part, body_7_3.part, body_8_3.part, body_11_1.part, body_12_1.part])
